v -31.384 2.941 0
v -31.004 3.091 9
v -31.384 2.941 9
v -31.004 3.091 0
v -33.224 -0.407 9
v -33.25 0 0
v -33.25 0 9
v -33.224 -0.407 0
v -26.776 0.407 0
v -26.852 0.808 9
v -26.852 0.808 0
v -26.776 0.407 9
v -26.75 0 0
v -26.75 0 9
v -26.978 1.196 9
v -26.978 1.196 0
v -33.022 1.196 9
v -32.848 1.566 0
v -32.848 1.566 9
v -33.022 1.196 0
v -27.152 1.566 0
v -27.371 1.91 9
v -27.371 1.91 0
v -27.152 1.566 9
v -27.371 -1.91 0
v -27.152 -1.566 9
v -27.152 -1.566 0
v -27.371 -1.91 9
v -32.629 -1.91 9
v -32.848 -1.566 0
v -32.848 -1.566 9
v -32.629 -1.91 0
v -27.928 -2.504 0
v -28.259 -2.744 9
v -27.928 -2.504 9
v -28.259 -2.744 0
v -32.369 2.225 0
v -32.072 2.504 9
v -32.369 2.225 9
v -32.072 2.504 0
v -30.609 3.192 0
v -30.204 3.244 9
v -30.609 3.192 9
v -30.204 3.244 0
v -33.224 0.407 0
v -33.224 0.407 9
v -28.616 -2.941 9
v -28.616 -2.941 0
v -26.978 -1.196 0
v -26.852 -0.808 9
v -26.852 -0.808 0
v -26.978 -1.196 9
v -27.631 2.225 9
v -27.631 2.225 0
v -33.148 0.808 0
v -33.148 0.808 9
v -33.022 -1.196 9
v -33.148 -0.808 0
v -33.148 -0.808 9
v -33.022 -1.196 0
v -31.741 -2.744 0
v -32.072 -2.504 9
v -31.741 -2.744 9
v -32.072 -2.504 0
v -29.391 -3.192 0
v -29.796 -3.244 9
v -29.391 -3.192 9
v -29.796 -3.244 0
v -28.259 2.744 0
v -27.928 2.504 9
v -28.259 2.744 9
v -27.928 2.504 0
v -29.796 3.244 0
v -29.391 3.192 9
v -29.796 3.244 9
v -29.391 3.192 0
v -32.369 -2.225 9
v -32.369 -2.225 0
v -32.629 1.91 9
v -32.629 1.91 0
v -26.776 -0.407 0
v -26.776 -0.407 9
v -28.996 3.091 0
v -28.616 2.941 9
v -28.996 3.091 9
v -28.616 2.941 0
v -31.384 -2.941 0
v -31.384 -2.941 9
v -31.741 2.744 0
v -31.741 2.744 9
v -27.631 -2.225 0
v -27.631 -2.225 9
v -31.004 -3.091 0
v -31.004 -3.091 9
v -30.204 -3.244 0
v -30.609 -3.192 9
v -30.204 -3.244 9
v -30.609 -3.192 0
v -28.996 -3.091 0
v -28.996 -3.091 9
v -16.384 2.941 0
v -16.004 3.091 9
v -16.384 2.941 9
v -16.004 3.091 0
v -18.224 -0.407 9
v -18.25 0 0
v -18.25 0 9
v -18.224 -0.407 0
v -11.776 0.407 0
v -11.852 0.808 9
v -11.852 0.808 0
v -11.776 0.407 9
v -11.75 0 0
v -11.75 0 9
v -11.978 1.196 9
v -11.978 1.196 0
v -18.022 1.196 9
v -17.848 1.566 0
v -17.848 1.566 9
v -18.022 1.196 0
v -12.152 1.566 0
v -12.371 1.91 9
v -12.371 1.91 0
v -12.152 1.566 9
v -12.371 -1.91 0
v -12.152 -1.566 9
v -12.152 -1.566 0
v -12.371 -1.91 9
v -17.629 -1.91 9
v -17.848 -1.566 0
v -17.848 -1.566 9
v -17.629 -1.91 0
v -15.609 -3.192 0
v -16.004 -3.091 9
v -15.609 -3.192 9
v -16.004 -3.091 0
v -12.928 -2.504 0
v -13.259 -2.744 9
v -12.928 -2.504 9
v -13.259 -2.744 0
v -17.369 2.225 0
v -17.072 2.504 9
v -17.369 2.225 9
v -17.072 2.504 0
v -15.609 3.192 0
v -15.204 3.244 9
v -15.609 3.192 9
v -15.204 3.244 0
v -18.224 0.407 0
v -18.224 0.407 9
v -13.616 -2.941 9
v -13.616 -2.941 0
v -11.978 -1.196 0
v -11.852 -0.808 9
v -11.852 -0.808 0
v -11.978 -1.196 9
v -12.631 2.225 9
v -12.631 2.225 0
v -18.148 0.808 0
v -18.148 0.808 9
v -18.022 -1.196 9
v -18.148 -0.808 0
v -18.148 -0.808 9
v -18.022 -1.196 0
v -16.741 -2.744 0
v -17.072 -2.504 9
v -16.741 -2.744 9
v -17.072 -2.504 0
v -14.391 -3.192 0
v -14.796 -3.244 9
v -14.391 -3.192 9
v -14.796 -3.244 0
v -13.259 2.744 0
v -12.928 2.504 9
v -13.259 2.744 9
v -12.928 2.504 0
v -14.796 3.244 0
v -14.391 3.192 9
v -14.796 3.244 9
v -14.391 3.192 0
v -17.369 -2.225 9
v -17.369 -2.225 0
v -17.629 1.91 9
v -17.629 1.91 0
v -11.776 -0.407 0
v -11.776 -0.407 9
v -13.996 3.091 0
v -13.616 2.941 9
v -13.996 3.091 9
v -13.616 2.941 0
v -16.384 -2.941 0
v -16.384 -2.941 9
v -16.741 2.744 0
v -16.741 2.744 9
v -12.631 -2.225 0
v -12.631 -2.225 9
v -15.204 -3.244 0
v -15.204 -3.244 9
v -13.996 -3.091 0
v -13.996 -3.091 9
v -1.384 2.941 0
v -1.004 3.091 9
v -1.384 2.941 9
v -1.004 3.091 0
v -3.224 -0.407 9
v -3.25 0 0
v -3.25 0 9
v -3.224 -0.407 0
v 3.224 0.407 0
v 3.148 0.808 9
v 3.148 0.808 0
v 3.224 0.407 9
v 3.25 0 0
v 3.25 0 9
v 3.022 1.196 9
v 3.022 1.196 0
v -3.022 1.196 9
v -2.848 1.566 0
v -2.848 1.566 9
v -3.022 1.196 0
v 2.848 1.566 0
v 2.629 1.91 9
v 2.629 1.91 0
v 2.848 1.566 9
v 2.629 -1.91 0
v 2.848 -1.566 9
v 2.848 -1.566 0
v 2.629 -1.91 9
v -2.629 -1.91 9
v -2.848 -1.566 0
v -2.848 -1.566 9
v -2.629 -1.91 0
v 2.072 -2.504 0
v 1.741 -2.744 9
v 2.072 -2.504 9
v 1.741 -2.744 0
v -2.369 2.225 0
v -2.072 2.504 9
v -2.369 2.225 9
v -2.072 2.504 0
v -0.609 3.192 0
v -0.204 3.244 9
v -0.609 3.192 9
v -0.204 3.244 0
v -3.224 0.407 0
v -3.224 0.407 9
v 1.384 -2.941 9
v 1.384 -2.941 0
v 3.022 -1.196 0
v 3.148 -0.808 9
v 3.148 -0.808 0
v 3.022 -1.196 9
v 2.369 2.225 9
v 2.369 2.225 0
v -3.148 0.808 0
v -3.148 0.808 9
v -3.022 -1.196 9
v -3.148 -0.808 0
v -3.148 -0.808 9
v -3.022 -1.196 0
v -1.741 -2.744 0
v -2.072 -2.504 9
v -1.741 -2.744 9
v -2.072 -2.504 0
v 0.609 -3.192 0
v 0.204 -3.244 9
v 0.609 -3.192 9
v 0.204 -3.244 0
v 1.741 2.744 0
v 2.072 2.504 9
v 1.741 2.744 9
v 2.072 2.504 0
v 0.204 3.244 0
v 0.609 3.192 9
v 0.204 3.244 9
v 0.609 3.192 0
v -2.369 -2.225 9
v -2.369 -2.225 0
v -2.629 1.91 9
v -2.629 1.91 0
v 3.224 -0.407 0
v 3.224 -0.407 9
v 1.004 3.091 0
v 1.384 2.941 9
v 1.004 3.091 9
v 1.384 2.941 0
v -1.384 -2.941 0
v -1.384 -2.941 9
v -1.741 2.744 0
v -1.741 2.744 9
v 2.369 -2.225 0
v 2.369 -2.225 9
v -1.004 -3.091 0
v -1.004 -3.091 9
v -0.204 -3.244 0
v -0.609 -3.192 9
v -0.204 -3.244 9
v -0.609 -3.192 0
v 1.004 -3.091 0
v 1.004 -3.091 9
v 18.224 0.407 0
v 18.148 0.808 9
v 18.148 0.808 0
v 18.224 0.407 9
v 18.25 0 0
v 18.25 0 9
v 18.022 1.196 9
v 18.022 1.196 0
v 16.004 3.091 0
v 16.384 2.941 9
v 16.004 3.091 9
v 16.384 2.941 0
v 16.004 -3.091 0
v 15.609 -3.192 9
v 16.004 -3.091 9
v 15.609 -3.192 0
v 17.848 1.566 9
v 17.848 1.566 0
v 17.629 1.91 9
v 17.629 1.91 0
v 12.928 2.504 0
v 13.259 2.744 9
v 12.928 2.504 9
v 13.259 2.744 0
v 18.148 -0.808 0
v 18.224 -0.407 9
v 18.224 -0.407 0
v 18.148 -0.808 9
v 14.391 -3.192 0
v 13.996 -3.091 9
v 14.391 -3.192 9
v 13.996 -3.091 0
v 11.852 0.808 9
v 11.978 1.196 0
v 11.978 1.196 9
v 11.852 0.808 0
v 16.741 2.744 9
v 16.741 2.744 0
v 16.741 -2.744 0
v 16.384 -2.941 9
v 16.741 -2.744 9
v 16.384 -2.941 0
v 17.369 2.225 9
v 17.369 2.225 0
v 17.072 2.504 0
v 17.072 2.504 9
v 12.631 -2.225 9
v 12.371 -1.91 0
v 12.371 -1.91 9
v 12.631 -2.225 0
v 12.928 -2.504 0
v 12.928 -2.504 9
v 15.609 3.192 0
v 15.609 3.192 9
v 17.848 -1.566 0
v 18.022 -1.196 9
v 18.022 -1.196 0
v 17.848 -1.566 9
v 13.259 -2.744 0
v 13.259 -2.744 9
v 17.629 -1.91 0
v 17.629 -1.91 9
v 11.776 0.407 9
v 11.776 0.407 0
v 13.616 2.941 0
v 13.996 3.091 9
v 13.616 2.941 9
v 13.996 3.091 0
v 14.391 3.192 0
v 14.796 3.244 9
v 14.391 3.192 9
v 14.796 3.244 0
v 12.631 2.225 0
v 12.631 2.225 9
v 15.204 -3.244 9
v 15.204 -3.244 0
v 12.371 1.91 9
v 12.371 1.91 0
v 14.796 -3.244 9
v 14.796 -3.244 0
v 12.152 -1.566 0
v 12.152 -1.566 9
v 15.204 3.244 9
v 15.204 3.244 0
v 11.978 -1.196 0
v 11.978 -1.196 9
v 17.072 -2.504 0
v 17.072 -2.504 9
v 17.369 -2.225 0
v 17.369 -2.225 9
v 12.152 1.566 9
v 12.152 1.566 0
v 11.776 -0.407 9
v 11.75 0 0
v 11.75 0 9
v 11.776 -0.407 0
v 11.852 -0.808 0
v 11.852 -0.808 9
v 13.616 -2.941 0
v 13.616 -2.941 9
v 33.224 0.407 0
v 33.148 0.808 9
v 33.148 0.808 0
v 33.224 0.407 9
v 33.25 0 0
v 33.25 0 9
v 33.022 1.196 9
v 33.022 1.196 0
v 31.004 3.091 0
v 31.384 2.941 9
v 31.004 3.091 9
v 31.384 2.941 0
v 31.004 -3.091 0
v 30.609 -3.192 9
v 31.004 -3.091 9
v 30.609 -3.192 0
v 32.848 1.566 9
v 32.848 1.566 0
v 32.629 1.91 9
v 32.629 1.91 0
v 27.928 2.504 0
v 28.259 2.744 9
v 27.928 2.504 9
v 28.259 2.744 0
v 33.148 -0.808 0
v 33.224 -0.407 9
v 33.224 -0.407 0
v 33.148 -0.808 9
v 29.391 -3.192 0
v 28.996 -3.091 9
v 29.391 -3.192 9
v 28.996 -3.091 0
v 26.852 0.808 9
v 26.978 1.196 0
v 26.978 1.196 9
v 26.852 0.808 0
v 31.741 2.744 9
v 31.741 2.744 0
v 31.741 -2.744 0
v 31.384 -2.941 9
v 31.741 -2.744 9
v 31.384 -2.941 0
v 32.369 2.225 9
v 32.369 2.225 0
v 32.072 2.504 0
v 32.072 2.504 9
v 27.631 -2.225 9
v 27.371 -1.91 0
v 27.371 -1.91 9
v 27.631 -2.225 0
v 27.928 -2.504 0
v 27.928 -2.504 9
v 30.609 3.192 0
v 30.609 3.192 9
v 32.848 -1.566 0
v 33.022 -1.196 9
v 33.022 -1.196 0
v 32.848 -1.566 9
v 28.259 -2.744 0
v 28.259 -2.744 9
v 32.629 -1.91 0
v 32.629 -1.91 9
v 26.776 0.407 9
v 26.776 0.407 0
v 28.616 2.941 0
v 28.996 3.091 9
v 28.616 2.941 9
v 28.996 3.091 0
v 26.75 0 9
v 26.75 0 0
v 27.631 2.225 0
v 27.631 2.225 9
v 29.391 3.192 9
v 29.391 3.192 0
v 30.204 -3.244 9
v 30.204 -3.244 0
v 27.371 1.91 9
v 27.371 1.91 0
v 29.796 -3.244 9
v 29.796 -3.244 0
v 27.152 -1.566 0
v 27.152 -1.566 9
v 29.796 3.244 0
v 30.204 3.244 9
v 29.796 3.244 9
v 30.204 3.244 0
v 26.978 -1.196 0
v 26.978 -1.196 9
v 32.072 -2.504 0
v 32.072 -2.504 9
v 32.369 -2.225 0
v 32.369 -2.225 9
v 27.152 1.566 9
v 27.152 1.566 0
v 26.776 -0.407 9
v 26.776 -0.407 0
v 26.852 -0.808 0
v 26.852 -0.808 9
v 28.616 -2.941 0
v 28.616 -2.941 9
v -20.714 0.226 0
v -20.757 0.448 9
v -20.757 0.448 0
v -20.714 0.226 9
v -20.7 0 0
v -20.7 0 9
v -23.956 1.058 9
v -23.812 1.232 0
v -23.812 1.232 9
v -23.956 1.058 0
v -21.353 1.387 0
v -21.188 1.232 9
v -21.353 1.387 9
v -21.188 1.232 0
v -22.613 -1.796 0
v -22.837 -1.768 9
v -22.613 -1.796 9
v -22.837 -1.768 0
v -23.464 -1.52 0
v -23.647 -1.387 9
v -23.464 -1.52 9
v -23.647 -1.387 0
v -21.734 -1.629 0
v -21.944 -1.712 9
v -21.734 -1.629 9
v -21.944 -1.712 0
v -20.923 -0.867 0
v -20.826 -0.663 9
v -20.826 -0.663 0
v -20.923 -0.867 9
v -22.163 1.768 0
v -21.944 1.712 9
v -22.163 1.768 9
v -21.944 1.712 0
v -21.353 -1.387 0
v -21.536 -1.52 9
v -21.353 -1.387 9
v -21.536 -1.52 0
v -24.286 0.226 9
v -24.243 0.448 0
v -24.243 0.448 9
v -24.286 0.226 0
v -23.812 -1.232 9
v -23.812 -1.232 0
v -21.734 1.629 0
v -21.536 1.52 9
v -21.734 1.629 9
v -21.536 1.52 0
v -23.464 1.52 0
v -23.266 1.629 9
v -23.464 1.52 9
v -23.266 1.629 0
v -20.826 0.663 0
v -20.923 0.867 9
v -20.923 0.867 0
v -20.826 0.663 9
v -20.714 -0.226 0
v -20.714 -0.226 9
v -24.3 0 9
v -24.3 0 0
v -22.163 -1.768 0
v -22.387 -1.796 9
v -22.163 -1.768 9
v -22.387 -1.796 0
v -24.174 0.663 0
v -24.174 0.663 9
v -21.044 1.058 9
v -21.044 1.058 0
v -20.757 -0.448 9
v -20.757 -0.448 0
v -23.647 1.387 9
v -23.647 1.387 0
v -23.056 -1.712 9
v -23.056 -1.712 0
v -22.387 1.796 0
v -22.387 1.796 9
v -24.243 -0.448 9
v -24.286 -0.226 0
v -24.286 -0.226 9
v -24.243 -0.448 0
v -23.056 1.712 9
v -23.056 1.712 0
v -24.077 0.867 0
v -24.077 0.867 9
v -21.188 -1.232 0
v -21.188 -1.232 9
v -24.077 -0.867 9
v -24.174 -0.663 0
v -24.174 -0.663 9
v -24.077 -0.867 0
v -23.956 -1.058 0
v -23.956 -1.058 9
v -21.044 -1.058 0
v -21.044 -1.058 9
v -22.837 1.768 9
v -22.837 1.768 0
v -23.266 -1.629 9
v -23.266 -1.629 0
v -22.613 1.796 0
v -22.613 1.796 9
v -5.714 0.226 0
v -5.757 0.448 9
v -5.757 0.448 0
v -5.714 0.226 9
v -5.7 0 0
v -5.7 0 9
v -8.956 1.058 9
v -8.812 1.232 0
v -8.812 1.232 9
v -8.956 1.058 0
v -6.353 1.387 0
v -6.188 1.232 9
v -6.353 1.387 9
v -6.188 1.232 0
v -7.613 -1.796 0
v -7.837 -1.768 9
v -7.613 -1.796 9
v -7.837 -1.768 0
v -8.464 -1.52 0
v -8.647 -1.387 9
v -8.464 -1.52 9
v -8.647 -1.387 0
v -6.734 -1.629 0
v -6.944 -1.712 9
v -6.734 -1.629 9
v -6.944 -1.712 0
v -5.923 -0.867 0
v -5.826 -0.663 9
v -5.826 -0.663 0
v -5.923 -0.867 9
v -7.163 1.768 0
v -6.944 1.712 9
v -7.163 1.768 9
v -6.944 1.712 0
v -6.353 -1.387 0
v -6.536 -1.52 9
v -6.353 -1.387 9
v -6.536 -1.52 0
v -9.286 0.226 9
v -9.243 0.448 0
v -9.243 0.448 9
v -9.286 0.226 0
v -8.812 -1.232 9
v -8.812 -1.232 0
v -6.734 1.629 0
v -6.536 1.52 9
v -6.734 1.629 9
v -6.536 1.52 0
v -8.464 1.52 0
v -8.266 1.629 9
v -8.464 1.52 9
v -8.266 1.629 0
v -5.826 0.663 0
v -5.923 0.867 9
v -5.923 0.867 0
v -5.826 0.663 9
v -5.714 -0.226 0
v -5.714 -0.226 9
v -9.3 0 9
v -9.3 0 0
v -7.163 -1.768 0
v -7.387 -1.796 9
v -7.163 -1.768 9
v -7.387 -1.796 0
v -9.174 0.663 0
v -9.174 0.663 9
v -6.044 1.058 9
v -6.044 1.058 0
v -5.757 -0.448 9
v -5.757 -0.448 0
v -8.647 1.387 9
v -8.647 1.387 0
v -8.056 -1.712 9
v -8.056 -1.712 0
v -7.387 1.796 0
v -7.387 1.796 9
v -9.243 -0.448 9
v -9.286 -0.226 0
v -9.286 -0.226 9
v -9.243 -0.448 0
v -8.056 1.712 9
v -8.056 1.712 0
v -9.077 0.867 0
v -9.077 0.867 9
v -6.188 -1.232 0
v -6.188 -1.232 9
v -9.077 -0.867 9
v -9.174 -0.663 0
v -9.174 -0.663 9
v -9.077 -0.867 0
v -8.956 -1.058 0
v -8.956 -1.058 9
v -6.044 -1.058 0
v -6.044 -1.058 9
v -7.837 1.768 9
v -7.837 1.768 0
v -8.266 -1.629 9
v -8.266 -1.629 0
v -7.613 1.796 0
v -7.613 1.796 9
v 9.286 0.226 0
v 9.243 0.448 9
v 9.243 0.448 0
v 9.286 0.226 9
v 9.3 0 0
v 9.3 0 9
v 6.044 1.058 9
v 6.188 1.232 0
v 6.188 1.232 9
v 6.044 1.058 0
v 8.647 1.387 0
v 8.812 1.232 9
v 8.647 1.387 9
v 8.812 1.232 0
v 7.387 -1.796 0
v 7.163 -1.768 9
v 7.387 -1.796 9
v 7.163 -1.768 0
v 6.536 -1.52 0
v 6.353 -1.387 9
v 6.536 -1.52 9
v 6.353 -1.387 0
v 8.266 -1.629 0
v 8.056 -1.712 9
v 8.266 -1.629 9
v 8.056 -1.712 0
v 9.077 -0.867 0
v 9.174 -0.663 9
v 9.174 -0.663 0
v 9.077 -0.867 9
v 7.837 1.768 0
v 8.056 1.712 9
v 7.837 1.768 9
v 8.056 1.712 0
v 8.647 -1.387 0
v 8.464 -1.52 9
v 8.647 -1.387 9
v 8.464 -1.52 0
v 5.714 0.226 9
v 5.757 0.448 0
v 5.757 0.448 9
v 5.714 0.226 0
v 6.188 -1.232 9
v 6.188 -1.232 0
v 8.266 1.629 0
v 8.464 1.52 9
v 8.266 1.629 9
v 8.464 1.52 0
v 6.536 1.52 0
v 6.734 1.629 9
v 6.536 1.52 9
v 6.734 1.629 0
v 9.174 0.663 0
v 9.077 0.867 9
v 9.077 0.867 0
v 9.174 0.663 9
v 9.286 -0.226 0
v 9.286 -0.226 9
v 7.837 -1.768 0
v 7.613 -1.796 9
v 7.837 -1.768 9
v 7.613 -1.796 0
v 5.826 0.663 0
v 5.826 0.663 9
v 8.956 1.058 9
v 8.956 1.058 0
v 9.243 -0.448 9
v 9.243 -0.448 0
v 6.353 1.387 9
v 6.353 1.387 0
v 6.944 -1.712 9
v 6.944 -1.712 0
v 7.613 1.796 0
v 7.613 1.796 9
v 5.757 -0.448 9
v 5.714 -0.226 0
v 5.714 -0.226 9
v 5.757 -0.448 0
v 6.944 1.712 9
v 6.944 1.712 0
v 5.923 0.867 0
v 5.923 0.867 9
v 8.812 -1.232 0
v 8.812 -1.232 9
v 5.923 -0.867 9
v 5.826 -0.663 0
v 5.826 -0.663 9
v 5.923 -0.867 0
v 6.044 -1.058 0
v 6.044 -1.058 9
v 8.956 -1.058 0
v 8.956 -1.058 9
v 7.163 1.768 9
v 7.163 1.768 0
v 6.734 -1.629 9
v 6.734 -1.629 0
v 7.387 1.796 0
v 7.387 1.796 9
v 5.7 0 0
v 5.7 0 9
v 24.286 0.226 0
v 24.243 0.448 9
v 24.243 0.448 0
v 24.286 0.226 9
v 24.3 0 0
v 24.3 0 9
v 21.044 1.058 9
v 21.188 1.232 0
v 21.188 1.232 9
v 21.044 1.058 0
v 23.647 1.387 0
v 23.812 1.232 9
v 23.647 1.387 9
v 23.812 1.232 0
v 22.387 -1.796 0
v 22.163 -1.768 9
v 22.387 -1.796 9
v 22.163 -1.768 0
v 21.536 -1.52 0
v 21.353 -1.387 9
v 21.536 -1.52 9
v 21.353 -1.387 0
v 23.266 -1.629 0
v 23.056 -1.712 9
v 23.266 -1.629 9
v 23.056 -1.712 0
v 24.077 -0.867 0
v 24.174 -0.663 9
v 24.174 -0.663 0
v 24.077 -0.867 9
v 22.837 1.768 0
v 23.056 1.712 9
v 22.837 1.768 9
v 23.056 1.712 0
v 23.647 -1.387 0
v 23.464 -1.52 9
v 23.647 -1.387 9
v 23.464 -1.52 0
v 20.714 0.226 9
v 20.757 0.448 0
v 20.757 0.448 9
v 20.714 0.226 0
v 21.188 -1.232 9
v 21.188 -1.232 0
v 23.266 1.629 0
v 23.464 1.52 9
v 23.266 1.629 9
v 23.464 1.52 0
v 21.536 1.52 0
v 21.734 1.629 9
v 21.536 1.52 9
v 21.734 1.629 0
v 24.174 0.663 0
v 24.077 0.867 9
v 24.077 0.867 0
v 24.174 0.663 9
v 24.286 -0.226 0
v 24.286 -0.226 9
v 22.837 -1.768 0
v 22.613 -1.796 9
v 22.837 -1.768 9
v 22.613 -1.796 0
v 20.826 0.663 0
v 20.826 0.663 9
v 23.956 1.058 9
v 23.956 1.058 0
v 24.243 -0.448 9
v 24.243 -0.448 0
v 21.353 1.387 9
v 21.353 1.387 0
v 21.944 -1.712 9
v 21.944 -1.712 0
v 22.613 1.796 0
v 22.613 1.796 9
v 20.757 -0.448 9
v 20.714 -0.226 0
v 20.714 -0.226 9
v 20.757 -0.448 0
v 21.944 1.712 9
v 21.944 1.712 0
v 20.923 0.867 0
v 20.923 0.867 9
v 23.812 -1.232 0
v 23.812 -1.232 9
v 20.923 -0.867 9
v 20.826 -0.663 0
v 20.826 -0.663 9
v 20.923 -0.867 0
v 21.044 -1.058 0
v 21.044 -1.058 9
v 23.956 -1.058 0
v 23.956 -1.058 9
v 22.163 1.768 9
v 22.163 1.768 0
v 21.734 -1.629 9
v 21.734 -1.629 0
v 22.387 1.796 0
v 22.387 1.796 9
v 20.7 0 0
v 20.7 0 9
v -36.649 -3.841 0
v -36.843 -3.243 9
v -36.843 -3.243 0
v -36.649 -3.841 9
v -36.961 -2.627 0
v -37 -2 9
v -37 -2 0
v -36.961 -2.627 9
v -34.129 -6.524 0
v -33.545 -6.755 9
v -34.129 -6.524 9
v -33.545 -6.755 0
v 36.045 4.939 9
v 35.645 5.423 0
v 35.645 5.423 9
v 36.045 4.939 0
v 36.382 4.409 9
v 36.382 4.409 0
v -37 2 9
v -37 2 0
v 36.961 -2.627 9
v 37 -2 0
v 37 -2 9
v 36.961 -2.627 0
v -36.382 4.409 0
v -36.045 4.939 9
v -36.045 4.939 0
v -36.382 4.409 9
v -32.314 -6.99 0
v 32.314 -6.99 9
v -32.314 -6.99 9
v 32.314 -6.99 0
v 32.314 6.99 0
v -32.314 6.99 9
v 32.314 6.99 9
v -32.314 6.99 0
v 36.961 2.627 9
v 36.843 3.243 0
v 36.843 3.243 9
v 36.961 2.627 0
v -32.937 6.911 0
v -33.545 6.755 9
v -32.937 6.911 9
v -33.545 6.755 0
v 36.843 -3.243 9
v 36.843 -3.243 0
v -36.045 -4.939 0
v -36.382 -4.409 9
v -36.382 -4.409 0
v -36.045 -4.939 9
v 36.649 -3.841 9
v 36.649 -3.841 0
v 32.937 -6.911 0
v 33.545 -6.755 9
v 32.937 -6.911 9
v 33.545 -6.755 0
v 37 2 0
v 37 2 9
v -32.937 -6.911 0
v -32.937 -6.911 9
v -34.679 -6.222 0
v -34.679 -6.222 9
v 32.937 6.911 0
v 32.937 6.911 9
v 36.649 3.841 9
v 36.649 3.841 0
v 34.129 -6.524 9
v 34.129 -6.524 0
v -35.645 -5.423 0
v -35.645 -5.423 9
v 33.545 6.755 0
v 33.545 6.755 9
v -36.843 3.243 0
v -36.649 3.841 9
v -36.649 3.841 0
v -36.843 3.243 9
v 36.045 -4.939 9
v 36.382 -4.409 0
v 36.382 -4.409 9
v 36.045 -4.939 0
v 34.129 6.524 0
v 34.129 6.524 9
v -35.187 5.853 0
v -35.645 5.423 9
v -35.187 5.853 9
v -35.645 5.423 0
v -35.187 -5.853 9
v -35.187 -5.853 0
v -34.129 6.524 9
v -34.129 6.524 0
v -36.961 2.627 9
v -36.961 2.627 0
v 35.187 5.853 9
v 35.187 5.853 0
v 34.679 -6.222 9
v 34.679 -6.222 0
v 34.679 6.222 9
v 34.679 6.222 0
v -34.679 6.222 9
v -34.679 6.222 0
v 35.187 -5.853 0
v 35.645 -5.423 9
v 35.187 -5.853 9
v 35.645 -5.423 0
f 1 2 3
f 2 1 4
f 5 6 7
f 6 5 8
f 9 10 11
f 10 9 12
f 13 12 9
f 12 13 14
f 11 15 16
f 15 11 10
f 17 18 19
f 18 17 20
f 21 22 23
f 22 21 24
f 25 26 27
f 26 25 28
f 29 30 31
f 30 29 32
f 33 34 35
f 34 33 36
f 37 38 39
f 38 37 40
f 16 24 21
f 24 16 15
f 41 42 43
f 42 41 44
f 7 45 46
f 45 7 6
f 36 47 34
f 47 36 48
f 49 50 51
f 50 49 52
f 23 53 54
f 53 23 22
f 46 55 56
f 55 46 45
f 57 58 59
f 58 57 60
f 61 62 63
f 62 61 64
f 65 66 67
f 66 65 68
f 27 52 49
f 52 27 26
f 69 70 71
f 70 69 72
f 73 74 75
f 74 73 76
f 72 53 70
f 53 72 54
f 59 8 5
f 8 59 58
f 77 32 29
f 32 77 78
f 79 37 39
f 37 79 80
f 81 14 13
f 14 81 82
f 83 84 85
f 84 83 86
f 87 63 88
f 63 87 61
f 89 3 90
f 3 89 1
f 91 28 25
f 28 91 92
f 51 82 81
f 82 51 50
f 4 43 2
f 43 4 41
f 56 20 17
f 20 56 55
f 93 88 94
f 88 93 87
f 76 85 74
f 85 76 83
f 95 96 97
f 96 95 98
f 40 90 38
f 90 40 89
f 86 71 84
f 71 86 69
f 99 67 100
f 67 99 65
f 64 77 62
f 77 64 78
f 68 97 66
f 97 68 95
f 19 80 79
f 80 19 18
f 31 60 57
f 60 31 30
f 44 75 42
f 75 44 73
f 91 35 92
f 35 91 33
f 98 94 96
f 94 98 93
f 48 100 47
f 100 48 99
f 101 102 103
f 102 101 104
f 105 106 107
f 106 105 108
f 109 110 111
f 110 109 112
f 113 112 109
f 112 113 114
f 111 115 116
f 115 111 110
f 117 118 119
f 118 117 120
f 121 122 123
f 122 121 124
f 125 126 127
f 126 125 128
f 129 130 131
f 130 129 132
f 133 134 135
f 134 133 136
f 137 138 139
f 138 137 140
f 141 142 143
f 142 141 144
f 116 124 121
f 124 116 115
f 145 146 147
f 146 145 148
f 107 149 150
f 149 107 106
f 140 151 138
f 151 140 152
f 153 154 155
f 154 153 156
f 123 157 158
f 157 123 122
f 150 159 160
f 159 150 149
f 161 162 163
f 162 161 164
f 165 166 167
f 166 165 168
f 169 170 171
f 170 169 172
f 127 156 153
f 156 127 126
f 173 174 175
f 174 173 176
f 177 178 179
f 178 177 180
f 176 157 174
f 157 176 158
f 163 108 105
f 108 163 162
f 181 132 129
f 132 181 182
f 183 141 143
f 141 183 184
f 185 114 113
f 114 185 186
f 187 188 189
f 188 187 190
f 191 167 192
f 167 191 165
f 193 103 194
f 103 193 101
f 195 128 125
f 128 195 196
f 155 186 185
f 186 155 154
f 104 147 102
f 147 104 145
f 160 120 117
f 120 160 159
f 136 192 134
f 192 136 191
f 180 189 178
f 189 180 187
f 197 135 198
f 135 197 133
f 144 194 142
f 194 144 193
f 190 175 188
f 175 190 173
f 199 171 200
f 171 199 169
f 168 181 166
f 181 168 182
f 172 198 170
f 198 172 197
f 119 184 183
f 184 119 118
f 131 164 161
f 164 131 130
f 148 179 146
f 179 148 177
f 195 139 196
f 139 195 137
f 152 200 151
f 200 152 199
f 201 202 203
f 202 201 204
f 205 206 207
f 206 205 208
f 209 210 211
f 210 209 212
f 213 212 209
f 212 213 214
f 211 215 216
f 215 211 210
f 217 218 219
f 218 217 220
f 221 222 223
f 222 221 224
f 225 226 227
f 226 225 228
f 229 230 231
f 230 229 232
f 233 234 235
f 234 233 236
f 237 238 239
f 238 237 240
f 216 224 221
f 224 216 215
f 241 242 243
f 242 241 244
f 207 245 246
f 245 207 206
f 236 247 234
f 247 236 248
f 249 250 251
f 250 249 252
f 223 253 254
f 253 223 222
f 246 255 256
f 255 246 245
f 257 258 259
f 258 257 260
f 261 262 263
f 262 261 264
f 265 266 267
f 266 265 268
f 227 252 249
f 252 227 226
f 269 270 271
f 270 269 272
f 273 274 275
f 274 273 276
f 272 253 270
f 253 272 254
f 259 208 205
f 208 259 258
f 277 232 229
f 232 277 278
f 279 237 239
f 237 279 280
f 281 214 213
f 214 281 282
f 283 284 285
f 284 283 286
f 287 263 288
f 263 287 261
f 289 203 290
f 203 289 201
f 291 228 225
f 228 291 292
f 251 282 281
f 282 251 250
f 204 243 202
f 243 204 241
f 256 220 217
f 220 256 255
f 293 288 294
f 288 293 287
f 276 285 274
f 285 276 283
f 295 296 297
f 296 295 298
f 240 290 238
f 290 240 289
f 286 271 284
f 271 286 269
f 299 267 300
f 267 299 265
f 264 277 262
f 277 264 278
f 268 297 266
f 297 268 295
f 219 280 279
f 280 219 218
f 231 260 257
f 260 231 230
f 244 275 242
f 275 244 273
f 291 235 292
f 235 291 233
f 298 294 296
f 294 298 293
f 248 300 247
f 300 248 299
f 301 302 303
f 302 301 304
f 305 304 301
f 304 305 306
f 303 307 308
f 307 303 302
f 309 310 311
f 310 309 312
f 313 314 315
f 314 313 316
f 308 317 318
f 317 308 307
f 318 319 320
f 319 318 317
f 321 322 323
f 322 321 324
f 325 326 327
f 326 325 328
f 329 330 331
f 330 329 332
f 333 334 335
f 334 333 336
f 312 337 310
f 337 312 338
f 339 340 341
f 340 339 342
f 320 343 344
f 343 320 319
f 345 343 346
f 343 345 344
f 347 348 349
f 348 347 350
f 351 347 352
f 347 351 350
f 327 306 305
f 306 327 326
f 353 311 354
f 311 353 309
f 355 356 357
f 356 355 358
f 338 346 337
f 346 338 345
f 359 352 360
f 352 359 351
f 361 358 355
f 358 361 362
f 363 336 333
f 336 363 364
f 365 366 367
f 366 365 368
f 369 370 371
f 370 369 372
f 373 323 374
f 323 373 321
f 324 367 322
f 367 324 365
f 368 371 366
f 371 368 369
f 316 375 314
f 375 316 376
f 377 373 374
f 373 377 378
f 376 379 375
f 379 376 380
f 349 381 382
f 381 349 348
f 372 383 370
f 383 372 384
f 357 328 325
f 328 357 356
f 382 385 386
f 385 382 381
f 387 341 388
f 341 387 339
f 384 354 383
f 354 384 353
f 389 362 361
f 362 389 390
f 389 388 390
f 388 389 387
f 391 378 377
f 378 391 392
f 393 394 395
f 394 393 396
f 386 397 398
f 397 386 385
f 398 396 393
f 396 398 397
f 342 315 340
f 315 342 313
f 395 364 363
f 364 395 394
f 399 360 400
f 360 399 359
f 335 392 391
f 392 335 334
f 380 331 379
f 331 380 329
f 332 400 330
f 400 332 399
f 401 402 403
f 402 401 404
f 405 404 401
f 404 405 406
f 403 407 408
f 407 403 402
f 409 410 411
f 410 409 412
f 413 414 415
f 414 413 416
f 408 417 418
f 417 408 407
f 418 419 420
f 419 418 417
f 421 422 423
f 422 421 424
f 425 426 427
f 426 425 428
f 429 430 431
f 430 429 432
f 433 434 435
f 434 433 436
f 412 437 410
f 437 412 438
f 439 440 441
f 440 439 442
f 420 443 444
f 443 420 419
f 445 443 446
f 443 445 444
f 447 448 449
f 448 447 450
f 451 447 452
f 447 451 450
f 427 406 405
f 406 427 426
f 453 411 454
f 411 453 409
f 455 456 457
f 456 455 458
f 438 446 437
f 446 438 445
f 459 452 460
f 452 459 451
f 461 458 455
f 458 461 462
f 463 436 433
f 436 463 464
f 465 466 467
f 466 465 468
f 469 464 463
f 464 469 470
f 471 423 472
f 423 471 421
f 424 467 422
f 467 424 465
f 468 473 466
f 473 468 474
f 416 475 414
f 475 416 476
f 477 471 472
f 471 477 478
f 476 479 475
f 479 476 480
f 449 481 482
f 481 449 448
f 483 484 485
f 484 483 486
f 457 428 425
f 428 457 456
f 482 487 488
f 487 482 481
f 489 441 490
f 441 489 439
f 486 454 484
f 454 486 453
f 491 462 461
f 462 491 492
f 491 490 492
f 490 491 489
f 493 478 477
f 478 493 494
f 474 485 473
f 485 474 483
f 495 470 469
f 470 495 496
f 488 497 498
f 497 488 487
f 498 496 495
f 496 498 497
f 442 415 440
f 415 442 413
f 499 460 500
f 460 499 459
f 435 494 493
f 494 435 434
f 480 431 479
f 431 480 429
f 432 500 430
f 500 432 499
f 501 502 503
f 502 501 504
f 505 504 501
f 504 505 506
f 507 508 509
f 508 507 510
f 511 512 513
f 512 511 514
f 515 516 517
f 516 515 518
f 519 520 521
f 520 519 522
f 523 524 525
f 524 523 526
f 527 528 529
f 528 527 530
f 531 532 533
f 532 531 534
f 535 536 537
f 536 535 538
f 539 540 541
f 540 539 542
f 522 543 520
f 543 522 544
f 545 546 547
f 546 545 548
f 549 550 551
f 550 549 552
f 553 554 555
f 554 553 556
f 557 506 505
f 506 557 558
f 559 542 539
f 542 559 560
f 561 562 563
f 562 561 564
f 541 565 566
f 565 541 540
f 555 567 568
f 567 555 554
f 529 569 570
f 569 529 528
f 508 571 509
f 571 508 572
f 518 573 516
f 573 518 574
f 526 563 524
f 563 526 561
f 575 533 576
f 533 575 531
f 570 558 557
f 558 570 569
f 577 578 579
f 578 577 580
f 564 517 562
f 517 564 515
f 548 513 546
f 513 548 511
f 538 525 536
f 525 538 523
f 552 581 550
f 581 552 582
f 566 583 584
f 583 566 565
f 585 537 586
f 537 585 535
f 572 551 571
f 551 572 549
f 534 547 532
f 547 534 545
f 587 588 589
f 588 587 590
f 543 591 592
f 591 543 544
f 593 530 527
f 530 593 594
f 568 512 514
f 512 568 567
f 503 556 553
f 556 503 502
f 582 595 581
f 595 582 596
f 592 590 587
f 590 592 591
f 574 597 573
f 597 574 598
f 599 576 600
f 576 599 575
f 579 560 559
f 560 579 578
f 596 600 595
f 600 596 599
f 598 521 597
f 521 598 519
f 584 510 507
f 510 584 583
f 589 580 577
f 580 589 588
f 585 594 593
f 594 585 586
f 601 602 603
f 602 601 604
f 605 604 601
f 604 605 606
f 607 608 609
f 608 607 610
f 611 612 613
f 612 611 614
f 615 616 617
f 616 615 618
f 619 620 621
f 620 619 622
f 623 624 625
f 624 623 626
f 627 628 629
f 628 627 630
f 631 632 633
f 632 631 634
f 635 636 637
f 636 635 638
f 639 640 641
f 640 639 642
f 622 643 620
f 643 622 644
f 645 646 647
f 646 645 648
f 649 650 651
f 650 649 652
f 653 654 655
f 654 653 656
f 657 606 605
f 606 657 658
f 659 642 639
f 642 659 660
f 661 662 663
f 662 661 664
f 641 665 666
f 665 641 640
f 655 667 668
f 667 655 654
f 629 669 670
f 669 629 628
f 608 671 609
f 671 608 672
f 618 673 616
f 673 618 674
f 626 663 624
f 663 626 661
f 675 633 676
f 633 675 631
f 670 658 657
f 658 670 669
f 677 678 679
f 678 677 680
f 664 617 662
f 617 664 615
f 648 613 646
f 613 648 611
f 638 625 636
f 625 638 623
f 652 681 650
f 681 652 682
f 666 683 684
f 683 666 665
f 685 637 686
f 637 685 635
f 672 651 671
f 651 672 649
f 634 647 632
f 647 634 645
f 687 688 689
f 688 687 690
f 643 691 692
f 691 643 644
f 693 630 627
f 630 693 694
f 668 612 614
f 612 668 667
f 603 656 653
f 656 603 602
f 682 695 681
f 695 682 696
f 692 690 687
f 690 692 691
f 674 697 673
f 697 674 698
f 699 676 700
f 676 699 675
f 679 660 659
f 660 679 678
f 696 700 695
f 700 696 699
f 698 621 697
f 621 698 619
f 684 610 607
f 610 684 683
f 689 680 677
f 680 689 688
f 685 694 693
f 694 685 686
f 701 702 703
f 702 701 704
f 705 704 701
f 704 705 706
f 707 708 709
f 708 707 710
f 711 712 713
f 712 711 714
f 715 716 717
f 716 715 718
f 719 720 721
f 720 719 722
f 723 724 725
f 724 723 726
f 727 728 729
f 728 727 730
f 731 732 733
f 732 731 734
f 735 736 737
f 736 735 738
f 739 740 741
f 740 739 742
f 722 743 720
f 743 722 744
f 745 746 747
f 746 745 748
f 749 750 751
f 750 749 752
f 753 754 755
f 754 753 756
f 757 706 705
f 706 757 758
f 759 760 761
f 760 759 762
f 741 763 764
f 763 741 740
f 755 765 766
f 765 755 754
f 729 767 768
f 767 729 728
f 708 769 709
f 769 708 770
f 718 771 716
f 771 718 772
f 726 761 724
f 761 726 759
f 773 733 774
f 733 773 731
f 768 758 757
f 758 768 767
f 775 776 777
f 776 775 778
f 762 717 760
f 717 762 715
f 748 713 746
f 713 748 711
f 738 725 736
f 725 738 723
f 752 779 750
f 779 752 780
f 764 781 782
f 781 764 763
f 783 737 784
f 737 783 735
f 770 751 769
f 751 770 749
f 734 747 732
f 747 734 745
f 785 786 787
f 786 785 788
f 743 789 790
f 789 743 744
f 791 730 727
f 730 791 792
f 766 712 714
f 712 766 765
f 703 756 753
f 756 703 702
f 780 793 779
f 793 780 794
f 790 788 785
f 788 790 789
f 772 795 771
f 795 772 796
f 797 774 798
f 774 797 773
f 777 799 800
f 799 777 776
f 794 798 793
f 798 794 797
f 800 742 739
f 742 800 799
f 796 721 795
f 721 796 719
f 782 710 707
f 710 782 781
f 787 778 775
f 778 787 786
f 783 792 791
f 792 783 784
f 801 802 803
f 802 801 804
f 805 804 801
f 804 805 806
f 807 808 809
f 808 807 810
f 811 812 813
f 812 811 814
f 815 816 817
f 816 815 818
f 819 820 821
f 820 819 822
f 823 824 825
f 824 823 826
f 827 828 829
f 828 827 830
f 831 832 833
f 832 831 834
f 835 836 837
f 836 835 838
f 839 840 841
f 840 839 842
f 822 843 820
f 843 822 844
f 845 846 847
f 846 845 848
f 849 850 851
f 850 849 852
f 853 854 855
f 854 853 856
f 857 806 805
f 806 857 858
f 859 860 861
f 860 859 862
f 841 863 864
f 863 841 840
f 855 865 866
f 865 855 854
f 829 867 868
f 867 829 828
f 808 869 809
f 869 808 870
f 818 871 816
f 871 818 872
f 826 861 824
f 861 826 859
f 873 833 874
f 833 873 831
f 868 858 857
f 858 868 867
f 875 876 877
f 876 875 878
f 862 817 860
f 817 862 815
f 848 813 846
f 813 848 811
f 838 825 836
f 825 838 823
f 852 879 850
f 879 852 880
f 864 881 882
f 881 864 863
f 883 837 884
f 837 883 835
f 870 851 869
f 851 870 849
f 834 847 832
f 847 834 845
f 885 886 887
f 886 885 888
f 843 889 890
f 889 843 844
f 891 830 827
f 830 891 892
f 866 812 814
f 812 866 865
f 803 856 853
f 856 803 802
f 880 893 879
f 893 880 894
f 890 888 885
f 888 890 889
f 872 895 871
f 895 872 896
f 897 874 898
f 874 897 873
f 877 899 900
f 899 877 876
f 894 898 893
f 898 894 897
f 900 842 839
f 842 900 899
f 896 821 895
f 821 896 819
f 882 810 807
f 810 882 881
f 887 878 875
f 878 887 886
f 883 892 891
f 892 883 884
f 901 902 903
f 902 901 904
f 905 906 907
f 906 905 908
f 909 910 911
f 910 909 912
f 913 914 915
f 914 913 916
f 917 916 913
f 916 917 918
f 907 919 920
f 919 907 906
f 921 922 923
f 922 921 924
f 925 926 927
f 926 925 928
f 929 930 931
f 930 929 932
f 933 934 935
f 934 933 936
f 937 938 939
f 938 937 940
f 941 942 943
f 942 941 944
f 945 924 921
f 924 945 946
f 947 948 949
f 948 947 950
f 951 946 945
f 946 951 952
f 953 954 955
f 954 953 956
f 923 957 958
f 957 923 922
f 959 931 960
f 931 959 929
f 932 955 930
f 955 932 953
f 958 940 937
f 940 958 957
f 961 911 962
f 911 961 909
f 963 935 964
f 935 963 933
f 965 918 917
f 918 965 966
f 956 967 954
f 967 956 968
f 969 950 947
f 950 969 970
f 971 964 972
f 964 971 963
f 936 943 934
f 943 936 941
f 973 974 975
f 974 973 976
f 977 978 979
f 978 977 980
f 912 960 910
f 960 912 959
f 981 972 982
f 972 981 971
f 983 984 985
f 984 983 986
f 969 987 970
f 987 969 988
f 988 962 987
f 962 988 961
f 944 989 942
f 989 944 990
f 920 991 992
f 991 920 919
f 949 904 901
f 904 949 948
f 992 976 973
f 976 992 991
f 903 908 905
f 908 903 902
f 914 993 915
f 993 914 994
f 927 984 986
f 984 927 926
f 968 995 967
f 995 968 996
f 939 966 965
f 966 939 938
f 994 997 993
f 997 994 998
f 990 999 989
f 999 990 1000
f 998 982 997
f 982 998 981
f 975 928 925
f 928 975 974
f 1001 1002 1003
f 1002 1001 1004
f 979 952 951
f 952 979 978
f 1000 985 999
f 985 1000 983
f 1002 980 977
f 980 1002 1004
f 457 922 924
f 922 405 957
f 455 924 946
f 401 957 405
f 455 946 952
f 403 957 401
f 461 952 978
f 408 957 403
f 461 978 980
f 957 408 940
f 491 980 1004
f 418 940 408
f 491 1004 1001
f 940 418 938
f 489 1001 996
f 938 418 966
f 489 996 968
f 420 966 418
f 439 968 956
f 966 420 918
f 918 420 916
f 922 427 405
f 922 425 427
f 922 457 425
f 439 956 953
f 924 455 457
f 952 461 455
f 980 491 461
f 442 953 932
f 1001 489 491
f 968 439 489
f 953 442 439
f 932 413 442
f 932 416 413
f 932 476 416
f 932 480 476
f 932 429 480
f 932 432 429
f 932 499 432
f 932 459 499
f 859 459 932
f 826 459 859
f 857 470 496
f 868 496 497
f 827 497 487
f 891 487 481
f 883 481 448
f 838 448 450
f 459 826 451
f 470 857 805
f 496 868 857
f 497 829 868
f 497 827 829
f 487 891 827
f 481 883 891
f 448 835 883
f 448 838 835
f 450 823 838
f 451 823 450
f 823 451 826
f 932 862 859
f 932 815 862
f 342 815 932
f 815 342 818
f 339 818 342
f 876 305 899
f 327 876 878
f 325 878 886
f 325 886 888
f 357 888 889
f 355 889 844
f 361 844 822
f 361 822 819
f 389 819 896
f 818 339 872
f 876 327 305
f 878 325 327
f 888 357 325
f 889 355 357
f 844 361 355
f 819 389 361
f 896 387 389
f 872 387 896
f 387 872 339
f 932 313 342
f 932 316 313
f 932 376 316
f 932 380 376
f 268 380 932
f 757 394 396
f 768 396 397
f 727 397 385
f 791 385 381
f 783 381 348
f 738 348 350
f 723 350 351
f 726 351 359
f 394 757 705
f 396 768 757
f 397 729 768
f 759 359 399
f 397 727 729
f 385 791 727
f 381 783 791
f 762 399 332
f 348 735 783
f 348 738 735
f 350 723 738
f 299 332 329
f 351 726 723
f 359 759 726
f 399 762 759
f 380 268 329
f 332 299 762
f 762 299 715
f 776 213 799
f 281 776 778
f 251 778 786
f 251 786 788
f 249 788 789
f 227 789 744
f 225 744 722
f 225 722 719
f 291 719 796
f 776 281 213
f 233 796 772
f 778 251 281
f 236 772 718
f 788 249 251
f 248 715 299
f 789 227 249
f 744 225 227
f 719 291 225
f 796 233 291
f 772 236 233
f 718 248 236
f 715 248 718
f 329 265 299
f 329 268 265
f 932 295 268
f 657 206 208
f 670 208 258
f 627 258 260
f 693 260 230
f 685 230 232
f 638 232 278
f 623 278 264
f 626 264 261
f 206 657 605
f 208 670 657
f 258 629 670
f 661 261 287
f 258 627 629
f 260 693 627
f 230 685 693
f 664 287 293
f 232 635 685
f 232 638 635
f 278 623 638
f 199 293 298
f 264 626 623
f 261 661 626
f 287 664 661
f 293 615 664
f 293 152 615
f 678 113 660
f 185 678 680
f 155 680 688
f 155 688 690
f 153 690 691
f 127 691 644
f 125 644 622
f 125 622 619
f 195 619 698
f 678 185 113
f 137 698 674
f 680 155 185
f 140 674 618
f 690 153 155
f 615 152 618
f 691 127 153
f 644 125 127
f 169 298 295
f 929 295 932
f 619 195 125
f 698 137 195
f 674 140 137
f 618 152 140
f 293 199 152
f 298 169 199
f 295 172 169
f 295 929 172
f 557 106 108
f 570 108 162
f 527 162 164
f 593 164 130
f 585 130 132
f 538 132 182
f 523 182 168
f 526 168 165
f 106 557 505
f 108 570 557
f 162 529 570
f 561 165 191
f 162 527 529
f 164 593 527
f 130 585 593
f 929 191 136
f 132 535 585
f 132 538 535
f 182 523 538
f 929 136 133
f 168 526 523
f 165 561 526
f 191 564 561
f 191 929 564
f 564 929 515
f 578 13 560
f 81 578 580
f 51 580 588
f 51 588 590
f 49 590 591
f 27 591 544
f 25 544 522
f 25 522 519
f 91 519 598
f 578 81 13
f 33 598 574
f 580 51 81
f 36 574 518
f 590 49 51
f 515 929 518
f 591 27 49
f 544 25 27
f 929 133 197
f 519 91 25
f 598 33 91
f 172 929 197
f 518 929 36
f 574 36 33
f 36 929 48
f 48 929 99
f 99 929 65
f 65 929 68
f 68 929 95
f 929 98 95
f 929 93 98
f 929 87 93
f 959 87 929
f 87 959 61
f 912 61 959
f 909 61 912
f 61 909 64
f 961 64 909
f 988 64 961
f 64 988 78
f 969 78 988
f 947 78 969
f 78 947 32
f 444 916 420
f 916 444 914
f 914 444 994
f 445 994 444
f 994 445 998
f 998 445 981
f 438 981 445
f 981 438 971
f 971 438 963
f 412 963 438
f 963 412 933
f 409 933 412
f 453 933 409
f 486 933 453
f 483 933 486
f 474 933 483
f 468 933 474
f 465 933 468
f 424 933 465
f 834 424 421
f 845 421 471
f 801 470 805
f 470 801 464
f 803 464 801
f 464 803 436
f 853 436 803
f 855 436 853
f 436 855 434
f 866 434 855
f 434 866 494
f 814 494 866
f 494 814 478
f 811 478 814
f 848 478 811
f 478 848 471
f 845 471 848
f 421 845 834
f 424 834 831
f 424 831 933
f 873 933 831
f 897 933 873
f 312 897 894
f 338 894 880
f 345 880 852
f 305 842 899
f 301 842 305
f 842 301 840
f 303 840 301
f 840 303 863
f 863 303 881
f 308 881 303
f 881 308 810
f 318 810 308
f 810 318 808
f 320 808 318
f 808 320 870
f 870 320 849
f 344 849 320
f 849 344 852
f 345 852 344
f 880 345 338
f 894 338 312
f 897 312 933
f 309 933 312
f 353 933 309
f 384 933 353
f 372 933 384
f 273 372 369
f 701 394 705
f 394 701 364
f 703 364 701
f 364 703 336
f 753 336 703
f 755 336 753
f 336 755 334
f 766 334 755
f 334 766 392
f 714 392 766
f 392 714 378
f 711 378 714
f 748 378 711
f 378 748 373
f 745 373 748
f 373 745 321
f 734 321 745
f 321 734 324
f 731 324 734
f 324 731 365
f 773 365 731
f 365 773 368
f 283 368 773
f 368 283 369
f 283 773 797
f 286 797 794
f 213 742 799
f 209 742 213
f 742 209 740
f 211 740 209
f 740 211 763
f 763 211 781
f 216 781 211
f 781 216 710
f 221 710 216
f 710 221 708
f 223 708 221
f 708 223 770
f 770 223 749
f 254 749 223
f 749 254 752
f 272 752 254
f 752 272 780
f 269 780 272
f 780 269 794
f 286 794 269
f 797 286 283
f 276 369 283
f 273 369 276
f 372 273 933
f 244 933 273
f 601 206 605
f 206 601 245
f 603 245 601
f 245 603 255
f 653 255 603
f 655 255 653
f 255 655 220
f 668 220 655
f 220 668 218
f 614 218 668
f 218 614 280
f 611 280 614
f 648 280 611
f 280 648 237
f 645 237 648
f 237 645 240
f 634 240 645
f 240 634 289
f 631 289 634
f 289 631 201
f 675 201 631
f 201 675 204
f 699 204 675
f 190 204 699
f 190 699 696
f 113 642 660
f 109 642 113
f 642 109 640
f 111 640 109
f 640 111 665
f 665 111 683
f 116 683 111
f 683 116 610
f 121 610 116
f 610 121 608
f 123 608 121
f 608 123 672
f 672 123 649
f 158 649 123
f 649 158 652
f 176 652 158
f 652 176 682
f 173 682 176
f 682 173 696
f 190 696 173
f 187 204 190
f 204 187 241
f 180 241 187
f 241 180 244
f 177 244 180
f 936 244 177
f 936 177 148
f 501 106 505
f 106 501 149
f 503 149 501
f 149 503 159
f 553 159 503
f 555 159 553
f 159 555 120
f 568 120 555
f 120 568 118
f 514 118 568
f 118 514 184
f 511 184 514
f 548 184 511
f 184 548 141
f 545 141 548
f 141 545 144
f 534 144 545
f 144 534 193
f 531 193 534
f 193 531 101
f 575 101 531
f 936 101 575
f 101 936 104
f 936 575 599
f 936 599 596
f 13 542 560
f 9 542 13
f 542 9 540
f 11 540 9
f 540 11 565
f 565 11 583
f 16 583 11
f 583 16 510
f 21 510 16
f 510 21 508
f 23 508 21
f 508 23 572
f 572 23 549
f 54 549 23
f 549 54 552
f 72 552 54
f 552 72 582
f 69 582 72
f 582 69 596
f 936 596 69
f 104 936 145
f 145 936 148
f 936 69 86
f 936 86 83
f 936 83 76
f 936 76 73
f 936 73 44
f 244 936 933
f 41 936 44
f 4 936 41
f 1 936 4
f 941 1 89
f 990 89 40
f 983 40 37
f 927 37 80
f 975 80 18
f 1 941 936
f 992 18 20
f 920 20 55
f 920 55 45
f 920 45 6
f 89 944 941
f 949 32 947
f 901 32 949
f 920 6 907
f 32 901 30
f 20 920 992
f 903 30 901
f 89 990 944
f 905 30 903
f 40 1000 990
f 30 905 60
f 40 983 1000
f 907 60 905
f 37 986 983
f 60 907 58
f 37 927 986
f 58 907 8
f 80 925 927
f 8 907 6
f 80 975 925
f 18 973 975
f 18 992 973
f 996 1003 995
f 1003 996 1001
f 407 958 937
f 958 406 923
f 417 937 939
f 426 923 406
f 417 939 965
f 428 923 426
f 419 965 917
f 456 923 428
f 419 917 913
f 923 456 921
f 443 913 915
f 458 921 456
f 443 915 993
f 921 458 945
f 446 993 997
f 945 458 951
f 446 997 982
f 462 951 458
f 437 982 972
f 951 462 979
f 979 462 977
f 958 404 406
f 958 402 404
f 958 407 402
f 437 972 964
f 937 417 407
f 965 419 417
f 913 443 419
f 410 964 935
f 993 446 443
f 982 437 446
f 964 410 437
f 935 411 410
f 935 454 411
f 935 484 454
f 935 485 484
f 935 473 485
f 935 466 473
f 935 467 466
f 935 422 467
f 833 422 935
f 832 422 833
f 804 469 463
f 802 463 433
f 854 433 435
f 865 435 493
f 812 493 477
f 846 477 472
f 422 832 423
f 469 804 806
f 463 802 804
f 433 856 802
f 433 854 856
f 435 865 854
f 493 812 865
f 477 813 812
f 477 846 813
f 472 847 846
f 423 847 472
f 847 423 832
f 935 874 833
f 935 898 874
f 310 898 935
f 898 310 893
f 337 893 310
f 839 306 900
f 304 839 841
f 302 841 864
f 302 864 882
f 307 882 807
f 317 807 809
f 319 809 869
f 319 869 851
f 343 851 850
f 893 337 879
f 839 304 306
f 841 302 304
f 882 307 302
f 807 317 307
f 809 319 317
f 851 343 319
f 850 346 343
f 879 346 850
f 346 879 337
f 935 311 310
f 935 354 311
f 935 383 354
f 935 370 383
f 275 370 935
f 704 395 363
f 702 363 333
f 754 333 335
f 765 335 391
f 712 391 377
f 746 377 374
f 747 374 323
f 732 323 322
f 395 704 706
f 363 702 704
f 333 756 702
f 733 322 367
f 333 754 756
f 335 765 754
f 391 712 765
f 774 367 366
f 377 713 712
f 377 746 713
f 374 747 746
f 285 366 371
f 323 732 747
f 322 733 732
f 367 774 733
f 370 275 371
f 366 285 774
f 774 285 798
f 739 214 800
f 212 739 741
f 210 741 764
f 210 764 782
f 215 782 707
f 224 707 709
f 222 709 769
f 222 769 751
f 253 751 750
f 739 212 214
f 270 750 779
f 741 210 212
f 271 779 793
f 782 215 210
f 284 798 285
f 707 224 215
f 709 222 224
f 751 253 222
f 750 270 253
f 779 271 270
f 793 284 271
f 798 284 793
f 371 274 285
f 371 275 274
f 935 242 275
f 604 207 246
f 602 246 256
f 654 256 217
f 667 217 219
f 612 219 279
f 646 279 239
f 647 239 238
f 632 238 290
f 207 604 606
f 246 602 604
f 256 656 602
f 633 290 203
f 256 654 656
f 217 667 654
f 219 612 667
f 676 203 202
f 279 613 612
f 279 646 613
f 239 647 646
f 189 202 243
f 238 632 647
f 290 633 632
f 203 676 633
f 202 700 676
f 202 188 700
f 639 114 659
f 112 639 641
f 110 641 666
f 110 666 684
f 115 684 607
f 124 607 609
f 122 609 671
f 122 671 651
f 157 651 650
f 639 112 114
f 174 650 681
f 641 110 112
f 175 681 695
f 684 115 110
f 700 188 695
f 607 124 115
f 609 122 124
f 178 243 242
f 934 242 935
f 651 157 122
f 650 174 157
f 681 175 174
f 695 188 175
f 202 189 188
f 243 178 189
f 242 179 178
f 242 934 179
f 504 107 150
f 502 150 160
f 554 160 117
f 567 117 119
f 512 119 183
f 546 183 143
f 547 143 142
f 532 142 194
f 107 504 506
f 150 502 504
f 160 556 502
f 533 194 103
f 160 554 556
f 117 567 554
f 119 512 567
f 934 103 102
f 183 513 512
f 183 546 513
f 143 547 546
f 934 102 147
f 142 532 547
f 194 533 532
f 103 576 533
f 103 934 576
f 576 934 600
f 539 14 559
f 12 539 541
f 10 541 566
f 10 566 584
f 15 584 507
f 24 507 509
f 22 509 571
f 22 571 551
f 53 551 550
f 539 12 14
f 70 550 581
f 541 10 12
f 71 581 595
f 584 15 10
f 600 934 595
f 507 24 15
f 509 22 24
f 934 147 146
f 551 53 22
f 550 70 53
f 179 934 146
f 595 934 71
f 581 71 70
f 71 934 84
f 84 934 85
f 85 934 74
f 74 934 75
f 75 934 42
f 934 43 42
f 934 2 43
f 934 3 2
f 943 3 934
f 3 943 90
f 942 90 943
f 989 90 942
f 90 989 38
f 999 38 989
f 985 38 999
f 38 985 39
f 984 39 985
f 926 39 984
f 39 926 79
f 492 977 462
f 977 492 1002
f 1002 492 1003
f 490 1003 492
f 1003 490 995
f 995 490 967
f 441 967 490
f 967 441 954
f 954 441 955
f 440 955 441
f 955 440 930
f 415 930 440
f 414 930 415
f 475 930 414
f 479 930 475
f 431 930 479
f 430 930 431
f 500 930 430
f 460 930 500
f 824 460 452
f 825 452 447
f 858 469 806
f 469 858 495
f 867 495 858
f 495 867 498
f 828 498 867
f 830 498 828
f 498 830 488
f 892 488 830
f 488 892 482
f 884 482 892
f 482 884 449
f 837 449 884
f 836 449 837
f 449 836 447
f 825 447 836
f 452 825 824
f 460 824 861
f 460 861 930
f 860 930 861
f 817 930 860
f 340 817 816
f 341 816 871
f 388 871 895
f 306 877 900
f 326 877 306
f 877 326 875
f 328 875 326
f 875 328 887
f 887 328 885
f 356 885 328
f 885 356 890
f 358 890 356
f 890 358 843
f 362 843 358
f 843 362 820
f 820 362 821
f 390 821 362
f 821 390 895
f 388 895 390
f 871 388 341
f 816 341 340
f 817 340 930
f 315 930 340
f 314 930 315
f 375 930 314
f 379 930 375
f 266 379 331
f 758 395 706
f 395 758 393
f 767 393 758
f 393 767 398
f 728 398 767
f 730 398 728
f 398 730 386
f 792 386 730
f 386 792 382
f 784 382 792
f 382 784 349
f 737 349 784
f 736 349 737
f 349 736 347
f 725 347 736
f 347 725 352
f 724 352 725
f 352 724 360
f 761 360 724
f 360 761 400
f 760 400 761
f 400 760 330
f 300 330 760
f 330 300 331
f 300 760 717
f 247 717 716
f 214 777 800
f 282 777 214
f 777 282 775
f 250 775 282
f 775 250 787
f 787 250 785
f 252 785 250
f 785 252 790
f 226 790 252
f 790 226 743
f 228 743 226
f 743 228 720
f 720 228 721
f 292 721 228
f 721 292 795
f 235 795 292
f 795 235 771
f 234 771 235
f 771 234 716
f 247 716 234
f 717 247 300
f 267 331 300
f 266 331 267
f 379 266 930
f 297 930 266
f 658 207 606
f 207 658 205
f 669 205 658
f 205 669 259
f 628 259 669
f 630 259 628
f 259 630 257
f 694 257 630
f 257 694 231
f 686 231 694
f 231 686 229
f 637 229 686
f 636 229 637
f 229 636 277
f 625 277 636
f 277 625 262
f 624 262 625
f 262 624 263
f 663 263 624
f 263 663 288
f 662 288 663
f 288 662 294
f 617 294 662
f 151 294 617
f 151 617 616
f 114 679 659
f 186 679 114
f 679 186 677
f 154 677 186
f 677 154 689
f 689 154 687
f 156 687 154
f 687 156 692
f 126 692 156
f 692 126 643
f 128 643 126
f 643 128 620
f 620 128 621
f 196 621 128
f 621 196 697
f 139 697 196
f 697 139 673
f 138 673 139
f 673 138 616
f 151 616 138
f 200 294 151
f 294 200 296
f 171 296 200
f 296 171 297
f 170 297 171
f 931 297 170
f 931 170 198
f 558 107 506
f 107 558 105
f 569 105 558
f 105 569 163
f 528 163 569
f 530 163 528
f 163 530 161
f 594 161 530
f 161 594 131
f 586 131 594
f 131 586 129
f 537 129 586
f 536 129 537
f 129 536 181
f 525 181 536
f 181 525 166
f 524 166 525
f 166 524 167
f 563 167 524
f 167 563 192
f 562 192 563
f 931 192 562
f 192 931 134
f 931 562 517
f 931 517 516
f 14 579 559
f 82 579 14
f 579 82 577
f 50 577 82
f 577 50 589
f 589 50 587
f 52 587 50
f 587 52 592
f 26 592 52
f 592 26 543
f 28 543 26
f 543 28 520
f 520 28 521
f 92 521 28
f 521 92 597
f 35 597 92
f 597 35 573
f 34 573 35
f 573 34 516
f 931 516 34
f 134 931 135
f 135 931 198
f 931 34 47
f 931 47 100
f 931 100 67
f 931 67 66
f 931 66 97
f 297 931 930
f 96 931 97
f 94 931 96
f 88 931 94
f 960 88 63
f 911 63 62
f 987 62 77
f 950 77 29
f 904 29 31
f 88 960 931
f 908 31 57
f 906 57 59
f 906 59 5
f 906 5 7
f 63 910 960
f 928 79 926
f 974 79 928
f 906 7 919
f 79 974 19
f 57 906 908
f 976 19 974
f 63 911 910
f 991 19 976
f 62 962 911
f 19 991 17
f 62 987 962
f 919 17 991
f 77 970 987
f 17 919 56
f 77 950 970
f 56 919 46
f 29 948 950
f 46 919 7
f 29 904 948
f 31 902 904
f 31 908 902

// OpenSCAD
$fn = 50;


difference() {
	union() {
		*color(alpha = 1.0000000000, c = "gray") {
			translate(v = [0, 7, 0]) {
				linear_extrude(height = 1) {
					text(font = "Arial:style=Bold", halign = "center", size = 4.5000000000, text = "COMMENT plate main", valign = "center");
				}
			}
		}
		*color(alpha = 1.0000000000, c = "gray") {
			translate(v = [0, 14, 0]) {
				linear_extrude(height = 1) {
					text(font = "Arial:style=Bold", halign = "center", size = 4.5000000000, text = "COMMENT description oobb_plate_shape_p_type_9_depth_5_width_1_height_9_thickness_true_both_holes", valign = "center");
				}
			}
		}
		hull() {
			translate(v = [-32.0000000000, 2.0000000000, 0]) {
				cylinder(h = 9, r = 5);
			}
			translate(v = [32.0000000000, 2.0000000000, 0]) {
				cylinder(h = 9, r = 5);
			}
			translate(v = [-32.0000000000, -2.0000000000, 0]) {
				cylinder(h = 9, r = 5);
			}
			translate(v = [32.0000000000, -2.0000000000, 0]) {
				cylinder(h = 9, r = 5);
			}
		}
	}
	union() {
		*color(alpha = 1.0000000000, c = "gray") {
			translate(v = [0, 7, 0]) {
				linear_extrude(height = 1) {
					text(font = "Arial:style=Bold", halign = "center", size = 4.5000000000, text = "COMMENT holes main", valign = "center");
				}
			}
		}
		*color(alpha = 1.0000000000, c = "gray") {
			translate(v = [0, 14, 0]) {
				linear_extrude(height = 1) {
					text(font = "Arial:style=Bold", halign = "center", size = 4.5000000000, text = "COMMENT description oobb_holes_shape_n_type_5_width_1_height_9_thickness_true_both_holes", valign = "center");
				}
			}
		}
		translate(v = [-30.0000000000, 0.0000000000, 0]) {
			translate(v = [0, 0, -50]) {
				cylinder(h = 100, r = 3.2500000000);
			}
		}
		translate(v = [-15.0000000000, 0.0000000000, 0]) {
			translate(v = [0, 0, -50]) {
				cylinder(h = 100, r = 3.2500000000);
			}
		}
		translate(v = [0, 0, -50]) {
			cylinder(h = 100, r = 3.2500000000);
		}
		translate(v = [15.0000000000, 0.0000000000, 0]) {
			translate(v = [0, 0, -50]) {
				cylinder(h = 100, r = 3.2500000000);
			}
		}
		translate(v = [30.0000000000, 0.0000000000, 0]) {
			translate(v = [0, 0, -50]) {
				cylinder(h = 100, r = 3.2500000000);
			}
		}
		translate(v = [-30.0000000000, 0.0000000000, 0]) {
			translate(v = [0, 0, -50]) {
				cylinder(h = 100, r = 1.8000000000);
			}
		}
		translate(v = [-22.5000000000, 0.0000000000, 0]) {
			translate(v = [0, 0, -50]) {
				cylinder(h = 100, r = 1.8000000000);
			}
		}
		translate(v = [-15.0000000000, 0.0000000000, 0]) {
			translate(v = [0, 0, -50]) {
				cylinder(h = 100, r = 1.8000000000);
			}
		}
		translate(v = [-7.5000000000, 0.0000000000, 0]) {
			translate(v = [0, 0, -50]) {
				cylinder(h = 100, r = 1.8000000000);
			}
		}
		translate(v = [0, 0, -50]) {
			cylinder(h = 100, r = 1.8000000000);
		}
		translate(v = [7.5000000000, 0.0000000000, 0]) {
			translate(v = [0, 0, -50]) {
				cylinder(h = 100, r = 1.8000000000);
			}
		}
		translate(v = [15.0000000000, 0.0000000000, 0]) {
			translate(v = [0, 0, -50]) {
				cylinder(h = 100, r = 1.8000000000);
			}
		}
		translate(v = [22.5000000000, 0.0000000000, 0]) {
			translate(v = [0, 0, -50]) {
				cylinder(h = 100, r = 1.8000000000);
			}
		}
		translate(v = [30.0000000000, 0.0000000000, 0]) {
			translate(v = [0, 0, -50]) {
				cylinder(h = 100, r = 1.8000000000);
			}
		}
	}
}
